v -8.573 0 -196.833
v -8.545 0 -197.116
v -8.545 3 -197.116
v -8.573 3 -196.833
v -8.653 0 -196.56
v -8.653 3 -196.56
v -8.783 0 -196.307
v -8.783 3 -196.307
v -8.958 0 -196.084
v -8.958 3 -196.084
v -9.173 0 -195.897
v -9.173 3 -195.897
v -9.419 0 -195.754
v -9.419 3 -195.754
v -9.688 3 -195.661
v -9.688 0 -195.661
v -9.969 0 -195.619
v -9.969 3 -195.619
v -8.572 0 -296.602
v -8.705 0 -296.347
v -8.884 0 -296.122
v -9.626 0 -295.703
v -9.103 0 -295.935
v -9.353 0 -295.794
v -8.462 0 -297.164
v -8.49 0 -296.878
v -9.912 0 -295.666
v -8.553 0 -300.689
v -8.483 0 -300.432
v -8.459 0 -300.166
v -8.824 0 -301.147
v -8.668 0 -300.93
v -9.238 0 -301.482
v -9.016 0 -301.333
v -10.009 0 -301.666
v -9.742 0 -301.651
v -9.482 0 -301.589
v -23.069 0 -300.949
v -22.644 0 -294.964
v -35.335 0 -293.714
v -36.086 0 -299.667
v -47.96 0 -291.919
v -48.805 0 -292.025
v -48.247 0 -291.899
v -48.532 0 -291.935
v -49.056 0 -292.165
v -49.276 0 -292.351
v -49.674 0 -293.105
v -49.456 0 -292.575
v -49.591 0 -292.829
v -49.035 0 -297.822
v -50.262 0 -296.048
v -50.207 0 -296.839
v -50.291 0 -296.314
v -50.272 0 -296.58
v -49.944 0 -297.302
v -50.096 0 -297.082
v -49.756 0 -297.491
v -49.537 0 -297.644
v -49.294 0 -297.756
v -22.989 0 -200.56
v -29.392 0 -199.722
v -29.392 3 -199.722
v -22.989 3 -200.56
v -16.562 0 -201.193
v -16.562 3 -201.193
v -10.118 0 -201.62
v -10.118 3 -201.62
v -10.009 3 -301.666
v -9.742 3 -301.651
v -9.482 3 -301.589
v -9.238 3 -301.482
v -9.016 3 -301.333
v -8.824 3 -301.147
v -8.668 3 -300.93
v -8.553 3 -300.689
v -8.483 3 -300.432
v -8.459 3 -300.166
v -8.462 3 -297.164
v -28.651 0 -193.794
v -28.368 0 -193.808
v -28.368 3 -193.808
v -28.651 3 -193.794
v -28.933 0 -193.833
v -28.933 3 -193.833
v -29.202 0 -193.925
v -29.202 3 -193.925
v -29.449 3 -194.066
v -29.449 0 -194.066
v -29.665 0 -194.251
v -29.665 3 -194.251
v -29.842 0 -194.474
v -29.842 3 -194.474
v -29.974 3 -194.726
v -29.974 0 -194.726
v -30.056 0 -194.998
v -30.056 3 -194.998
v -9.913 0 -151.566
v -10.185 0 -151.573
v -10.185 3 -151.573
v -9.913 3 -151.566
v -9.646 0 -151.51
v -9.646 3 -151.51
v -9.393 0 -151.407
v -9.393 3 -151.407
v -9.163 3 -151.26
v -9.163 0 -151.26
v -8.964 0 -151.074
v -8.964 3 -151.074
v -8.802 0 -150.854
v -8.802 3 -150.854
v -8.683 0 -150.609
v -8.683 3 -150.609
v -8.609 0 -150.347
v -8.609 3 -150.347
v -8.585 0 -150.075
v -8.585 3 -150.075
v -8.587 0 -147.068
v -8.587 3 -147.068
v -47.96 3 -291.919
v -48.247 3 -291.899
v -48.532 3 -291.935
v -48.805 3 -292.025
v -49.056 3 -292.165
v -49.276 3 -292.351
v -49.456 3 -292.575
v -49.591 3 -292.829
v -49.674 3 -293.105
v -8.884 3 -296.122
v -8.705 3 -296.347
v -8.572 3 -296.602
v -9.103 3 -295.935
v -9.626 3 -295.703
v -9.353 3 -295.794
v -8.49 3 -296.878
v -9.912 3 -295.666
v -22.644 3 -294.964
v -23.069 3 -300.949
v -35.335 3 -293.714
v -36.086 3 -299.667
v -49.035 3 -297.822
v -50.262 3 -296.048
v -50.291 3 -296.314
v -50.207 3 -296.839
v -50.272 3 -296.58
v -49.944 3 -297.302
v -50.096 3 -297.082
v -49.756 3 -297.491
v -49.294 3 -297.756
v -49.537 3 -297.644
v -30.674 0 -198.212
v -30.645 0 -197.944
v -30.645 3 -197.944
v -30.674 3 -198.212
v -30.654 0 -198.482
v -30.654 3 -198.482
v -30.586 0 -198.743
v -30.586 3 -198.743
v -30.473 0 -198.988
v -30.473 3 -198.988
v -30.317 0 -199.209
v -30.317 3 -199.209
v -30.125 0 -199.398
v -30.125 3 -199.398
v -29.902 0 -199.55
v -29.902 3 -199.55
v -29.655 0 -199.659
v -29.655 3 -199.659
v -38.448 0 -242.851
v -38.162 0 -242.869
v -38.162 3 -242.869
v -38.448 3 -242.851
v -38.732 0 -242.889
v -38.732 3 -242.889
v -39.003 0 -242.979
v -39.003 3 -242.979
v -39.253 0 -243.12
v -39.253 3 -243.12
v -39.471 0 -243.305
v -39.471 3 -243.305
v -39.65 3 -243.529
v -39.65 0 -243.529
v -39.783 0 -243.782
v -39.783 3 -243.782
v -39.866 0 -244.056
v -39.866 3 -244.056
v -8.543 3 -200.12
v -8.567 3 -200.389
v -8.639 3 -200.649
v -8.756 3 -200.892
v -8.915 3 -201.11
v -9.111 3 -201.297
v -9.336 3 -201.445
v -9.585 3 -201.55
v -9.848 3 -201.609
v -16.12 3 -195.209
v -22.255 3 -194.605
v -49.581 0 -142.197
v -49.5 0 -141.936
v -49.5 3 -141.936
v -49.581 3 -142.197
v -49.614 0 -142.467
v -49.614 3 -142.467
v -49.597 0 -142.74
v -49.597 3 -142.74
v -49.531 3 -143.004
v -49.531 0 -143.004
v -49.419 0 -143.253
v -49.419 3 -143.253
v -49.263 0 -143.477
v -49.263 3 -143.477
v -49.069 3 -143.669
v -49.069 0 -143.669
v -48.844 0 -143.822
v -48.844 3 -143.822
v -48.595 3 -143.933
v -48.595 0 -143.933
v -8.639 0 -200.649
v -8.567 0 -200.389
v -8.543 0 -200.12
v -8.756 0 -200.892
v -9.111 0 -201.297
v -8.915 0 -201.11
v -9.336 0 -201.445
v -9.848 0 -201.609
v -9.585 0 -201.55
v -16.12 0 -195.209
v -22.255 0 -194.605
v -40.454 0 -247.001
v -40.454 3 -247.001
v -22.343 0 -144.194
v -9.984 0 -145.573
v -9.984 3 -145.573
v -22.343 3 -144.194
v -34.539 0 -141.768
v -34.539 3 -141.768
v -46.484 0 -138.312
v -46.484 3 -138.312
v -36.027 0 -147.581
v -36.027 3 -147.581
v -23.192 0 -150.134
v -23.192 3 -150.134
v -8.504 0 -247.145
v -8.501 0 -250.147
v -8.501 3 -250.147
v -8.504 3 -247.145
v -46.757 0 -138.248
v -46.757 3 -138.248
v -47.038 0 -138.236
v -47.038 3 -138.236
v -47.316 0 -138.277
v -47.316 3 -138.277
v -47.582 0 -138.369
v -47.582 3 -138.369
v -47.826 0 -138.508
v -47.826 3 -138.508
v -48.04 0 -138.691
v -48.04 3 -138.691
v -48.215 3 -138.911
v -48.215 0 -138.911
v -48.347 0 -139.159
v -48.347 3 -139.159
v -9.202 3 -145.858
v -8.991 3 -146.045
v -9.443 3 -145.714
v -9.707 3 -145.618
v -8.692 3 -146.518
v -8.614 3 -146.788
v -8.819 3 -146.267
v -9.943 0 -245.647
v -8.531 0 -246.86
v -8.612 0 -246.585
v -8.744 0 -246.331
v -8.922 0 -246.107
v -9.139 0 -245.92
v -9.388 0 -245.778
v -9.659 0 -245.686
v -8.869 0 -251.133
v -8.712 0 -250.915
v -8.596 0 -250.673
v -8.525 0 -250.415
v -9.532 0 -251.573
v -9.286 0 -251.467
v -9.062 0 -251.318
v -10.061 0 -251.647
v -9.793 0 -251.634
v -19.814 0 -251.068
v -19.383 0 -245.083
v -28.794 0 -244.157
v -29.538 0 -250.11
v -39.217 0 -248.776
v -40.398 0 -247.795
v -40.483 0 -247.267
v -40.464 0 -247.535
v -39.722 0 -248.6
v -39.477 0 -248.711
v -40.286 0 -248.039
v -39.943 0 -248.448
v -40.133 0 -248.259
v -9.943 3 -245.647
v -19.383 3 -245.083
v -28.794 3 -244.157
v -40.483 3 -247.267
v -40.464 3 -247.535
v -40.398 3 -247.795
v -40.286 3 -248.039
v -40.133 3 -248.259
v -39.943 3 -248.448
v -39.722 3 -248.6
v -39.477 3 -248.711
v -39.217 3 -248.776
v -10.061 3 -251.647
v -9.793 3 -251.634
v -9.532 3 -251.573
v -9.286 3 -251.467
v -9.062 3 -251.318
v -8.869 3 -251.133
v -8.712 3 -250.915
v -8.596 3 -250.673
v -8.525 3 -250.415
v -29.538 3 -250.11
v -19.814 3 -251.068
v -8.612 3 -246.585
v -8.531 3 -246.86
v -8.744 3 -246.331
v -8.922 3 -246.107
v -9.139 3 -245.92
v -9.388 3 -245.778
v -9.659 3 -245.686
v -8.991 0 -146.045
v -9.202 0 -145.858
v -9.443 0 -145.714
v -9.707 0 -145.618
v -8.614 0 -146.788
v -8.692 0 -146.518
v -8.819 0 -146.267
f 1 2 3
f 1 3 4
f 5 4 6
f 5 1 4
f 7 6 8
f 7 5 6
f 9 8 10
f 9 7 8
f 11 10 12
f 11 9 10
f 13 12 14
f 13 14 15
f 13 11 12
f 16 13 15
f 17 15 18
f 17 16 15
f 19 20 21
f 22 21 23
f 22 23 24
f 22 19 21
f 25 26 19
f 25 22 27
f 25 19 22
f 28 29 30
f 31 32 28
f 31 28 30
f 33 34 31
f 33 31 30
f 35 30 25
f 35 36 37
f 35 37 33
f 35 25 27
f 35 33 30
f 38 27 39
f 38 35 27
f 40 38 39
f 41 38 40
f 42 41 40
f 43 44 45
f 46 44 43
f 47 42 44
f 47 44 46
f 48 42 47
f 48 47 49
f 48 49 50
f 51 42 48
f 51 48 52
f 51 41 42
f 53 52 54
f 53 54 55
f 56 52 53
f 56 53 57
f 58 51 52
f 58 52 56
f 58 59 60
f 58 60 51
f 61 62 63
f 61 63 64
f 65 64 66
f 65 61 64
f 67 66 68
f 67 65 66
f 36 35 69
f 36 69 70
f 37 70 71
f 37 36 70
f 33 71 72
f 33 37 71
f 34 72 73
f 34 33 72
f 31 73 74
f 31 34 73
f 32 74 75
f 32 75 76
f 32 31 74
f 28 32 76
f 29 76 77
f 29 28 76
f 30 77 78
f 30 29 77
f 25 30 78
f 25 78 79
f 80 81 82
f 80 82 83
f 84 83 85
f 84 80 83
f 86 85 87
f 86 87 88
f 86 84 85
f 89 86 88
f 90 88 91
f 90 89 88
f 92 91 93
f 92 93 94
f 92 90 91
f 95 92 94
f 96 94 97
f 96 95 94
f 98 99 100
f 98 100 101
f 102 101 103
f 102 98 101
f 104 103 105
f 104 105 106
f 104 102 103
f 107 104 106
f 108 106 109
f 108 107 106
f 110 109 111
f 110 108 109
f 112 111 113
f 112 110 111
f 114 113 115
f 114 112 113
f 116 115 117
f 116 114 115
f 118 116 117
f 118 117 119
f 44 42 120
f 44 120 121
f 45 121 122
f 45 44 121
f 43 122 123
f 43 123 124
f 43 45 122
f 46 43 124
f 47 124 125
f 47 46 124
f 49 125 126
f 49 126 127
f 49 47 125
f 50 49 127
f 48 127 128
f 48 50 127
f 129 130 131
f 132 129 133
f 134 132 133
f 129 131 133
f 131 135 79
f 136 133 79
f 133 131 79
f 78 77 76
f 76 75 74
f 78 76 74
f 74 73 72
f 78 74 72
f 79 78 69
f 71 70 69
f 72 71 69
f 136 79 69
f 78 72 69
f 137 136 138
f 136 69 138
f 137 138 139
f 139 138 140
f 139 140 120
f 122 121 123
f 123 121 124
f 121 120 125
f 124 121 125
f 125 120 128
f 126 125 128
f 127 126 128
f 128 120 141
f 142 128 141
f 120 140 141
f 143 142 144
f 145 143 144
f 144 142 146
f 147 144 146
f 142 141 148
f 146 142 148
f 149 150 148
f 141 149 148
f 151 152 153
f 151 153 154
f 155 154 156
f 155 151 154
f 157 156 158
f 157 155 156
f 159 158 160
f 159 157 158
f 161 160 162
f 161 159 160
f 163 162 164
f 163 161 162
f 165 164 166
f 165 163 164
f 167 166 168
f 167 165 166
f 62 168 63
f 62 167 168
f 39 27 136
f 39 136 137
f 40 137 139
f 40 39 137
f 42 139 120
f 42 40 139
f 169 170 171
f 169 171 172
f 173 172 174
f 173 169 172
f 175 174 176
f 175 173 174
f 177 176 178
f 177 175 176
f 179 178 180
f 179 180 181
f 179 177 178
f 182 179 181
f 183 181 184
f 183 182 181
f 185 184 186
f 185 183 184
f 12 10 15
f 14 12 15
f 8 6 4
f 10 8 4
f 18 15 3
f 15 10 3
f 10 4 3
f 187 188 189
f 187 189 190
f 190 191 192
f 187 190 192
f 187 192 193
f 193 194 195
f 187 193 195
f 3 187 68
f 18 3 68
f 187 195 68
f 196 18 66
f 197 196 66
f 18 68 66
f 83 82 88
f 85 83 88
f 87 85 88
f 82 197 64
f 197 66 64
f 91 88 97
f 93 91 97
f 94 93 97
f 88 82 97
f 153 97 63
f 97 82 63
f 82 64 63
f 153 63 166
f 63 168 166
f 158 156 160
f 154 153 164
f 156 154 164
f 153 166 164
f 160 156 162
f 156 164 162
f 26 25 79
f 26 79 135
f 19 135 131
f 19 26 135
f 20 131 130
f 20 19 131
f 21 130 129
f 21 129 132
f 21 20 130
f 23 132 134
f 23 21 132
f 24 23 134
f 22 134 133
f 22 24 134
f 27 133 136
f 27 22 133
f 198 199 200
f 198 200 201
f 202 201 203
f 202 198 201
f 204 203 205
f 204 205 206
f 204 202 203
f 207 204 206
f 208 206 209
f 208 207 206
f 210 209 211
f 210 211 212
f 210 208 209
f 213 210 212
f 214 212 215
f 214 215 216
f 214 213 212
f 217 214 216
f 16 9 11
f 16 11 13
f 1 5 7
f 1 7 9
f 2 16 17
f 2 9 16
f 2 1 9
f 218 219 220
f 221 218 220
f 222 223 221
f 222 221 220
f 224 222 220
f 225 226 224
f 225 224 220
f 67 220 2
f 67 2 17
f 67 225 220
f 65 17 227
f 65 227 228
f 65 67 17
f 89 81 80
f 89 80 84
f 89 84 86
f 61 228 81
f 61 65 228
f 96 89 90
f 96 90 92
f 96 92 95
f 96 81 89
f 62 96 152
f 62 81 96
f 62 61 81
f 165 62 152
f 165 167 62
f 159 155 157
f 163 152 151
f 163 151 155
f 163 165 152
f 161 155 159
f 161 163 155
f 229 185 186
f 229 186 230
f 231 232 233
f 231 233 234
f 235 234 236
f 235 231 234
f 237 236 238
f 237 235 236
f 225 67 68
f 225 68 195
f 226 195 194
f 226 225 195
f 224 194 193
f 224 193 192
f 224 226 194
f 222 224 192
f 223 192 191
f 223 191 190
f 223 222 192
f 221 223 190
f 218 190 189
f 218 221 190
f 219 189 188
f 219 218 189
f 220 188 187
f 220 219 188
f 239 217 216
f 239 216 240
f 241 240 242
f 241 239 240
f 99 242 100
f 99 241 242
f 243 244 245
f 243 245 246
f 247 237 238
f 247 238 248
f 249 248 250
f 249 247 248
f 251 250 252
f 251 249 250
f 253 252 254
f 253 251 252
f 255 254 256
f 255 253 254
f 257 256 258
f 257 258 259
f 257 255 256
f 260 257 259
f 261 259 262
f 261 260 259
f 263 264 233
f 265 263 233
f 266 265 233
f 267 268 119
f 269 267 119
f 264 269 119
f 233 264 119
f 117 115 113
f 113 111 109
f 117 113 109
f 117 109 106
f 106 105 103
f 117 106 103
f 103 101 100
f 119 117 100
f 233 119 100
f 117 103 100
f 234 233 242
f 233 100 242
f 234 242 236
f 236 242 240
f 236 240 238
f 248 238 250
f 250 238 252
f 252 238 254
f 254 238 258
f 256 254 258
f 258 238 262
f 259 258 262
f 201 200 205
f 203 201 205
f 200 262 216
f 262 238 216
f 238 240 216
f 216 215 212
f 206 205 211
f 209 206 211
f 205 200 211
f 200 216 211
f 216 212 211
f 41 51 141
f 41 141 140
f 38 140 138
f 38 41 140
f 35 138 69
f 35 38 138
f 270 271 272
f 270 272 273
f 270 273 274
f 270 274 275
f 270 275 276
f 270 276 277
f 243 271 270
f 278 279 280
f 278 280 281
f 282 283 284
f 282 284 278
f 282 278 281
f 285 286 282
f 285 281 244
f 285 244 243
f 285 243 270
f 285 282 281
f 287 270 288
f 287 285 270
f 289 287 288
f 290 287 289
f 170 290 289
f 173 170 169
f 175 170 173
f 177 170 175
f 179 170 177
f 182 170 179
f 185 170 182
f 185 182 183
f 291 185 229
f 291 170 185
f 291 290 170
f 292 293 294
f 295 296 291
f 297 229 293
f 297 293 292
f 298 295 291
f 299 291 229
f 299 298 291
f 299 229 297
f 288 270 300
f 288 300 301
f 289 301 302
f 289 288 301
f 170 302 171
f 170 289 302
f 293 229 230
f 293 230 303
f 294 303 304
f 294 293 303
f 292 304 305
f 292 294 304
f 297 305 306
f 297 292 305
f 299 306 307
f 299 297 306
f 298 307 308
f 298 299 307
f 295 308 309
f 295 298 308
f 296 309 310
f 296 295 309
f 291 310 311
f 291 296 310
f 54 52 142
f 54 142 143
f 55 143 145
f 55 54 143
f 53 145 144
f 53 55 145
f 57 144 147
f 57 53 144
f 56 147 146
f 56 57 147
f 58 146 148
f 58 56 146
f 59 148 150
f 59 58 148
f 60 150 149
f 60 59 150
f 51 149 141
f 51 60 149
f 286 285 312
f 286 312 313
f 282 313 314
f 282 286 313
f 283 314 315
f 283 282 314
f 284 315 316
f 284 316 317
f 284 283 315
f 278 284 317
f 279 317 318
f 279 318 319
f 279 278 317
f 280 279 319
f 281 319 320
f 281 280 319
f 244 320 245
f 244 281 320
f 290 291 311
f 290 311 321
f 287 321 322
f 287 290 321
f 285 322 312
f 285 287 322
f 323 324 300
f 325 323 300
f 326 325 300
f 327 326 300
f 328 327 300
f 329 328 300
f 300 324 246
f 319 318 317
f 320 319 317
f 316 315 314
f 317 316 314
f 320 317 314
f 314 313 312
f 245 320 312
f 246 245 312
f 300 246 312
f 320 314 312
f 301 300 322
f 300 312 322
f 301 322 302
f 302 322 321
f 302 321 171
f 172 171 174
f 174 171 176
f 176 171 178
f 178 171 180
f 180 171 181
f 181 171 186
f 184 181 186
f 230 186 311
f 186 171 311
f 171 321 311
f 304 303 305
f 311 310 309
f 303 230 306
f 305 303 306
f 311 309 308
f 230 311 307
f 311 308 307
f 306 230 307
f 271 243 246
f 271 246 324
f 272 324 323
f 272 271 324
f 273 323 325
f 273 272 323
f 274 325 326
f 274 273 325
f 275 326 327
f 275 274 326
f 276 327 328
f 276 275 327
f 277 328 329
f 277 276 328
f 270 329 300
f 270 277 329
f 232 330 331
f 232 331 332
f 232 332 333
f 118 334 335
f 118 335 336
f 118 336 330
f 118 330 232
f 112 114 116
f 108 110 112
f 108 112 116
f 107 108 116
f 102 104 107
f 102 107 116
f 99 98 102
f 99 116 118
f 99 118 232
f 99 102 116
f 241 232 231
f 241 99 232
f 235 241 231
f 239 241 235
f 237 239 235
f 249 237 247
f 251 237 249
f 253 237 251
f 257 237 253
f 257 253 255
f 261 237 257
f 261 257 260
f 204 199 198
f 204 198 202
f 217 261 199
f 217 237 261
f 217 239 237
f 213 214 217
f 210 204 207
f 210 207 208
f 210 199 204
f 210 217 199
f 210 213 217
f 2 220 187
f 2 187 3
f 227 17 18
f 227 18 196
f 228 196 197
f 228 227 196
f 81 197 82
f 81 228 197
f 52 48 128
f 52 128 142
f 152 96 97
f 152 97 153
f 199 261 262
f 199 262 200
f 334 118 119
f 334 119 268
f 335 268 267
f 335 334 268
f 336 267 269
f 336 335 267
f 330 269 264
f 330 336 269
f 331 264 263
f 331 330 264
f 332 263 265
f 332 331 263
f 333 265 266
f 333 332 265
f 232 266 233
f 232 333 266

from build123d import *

# Parameters (mm, degrees)
AUFSATZ_LINEAR_AUSTRAGEN1_DEPTH   = 3
AUFSATZ_LINEAR_AUSTRAGEN1_2_DEPTH = 3
AUFSATZ_LINEAR_AUSTRAGEN1_3_DEPTH = 3
AUFSATZ_LINEAR_AUSTRAGEN1_4_DEPTH = 3


with BuildPart() as part:
    # Skizze1 → Aufsatz-Linear austragen1 (new body)
    with BuildSketch(Plane(origin=(0, 0, 0), x_dir=(1, 0, 0), z_dir=(0, 1, 0))):
        with BuildLine():
            Line((-8.459259515, 300.16557037), (-8.461766311, 297.163818853))
            ThreePointArc((-8.461766311, 297.163818853), (-8.883919397, 296.121880665), (-9.911510017, 295.665913636))
            ThreePointArc((-9.911510017, 295.665913636), (-28.996200706, 294.407525145), (-47.95969069, 291.918547863))
            ThreePointArc((-47.95969069, 291.918547863), (-49.056377816, 292.165205658), (-49.673747794, 293.104576208))
            Line((-49.673747794, 293.104576208), (-50.262352563, 296.048073311))
            ThreePointArc((-50.262352563, 296.048073311), (-50.025118954, 297.195499354), (-49.035160138, 297.822275112))
            ThreePointArc((-49.035160138, 297.822275112), (-29.5845698, 300.378607282), (-10.00900024, 301.665998079))
            ThreePointArc((-10.00900024, 301.665998079), (-8.915883192, 301.244490397), (-8.459259515, 300.16557037))
        make_face()
    extrude(amount=AUFSATZ_LINEAR_AUSTRAGEN1_DEPTH)


with BuildPart() as body_2:
    # Skizze1 → Aufsatz-Linear austragen1 2 (new body)
    with BuildSketch(Plane(origin=(0, 0, 0), x_dir=(1, 0, 0), z_dir=(0, 1, 0))):
        with BuildLine():
            Line((-48.346968769, 139.159115699), (-49.50004695, 141.936330487))
            ThreePointArc((-49.50004695, 141.936330487), (-49.480752189, 143.13112709), (-48.594528312, 143.932699575))
            ThreePointArc((-48.594528312, 143.932699575), (-29.63707112, 148.995618071), (-10.185169404, 151.572796085))
            ThreePointArc((-10.185169404, 151.572796085), (-9.059656793, 151.171382867), (-8.584601893, 150.074918526))
            Line((-8.584601893, 150.074918526), (-8.587113136, 147.06784271))
            ThreePointArc((-8.587113136, 147.06784271), (-8.991191611, 146.044909281), (-9.98447239, 145.572611168))
            ThreePointArc((-9.98447239, 145.572611168), (-28.466529188, 143.110906388), (-46.483776816, 138.312448117))
            ThreePointArc((-46.483776816, 138.312448117), (-47.582189261, 138.368682579), (-48.346968769, 139.159115699))
        make_face()
    extrude(amount=AUFSATZ_LINEAR_AUSTRAGEN1_2_DEPTH)


with BuildPart() as body_3:
    # Skizze1 → Aufsatz-Linear austragen1 3 (new body)
    with BuildSketch(Plane(origin=(0, 0, 0), x_dir=(1, 0, 0), z_dir=(0, 1, 0))):
        with BuildLine():
            Line((-30.055632937, 194.998228293), (-30.644675496, 197.943914697))
            ThreePointArc((-30.644675496, 197.943914697), (-30.400116287, 199.101835671), (-29.392191291, 199.722059334))
            ThreePointArc((-29.392191291, 199.722059334), (-19.777857967, 200.902061283), (-10.117988803, 201.619513431))
            ThreePointArc((-10.117988803, 201.619513431), (-9.008616199, 201.207882549), (-8.542808565, 200.120145998))
            Line((-8.542808565, 200.120145998), (-8.545317206, 197.116185466))
            ThreePointArc((-8.545317206, 197.116185466), (-8.958431865, 196.083667659), (-9.968974137, 195.619382121))
            ThreePointArc((-9.968974137, 195.619382121), (-19.18962485, 194.930965741), (-28.367514003, 193.808171283))
            ThreePointArc((-28.367514003, 193.808171283), (-29.449023063, 194.066372937), (-30.055632937, 194.998228293))
        make_face()
    extrude(amount=AUFSATZ_LINEAR_AUSTRAGEN1_3_DEPTH)


with BuildPart() as body_4:
    # Skizze1 → Aufsatz-Linear austragen1 4 (new body)
    with BuildSketch(Plane(origin=(0, 0, 0), x_dir=(1, 0, 0), z_dir=(0, 1, 0))):
        with BuildLine():
            Line((-39.865659916, 244.056250782), (-40.454418425, 247.000516708))
            ThreePointArc((-40.454418425, 247.000516708), (-40.214264333, 248.152149643), (-39.217113967, 248.776347971))
            ThreePointArc((-39.217113967, 248.776347971), (-24.680817217, 250.636211668), (-10.060952395, 251.647433078))
            ThreePointArc((-10.060952395, 251.647433078), (-8.961319795, 251.229834989), (-8.501030266, 250.147377798))
            Line((-8.501030266, 250.147377798), (-8.50353771, 247.144850529))
            ThreePointArc((-8.50353771, 247.144850529), (-8.922075337, 246.106660909), (-9.942872548, 245.647330431))
            ThreePointArc((-9.942872548, 245.647330431), (-24.092502498, 244.665124171), (-38.161941621, 242.8685609))
            ThreePointArc((-38.161941621, 242.8685609), (-39.252590255, 243.119866915), (-39.865659916, 244.056250782))
        make_face()
    extrude(amount=AUFSATZ_LINEAR_AUSTRAGEN1_4_DEPTH)


solid = Compound([part.part, body_2.part, body_3.part, body_4.part])
